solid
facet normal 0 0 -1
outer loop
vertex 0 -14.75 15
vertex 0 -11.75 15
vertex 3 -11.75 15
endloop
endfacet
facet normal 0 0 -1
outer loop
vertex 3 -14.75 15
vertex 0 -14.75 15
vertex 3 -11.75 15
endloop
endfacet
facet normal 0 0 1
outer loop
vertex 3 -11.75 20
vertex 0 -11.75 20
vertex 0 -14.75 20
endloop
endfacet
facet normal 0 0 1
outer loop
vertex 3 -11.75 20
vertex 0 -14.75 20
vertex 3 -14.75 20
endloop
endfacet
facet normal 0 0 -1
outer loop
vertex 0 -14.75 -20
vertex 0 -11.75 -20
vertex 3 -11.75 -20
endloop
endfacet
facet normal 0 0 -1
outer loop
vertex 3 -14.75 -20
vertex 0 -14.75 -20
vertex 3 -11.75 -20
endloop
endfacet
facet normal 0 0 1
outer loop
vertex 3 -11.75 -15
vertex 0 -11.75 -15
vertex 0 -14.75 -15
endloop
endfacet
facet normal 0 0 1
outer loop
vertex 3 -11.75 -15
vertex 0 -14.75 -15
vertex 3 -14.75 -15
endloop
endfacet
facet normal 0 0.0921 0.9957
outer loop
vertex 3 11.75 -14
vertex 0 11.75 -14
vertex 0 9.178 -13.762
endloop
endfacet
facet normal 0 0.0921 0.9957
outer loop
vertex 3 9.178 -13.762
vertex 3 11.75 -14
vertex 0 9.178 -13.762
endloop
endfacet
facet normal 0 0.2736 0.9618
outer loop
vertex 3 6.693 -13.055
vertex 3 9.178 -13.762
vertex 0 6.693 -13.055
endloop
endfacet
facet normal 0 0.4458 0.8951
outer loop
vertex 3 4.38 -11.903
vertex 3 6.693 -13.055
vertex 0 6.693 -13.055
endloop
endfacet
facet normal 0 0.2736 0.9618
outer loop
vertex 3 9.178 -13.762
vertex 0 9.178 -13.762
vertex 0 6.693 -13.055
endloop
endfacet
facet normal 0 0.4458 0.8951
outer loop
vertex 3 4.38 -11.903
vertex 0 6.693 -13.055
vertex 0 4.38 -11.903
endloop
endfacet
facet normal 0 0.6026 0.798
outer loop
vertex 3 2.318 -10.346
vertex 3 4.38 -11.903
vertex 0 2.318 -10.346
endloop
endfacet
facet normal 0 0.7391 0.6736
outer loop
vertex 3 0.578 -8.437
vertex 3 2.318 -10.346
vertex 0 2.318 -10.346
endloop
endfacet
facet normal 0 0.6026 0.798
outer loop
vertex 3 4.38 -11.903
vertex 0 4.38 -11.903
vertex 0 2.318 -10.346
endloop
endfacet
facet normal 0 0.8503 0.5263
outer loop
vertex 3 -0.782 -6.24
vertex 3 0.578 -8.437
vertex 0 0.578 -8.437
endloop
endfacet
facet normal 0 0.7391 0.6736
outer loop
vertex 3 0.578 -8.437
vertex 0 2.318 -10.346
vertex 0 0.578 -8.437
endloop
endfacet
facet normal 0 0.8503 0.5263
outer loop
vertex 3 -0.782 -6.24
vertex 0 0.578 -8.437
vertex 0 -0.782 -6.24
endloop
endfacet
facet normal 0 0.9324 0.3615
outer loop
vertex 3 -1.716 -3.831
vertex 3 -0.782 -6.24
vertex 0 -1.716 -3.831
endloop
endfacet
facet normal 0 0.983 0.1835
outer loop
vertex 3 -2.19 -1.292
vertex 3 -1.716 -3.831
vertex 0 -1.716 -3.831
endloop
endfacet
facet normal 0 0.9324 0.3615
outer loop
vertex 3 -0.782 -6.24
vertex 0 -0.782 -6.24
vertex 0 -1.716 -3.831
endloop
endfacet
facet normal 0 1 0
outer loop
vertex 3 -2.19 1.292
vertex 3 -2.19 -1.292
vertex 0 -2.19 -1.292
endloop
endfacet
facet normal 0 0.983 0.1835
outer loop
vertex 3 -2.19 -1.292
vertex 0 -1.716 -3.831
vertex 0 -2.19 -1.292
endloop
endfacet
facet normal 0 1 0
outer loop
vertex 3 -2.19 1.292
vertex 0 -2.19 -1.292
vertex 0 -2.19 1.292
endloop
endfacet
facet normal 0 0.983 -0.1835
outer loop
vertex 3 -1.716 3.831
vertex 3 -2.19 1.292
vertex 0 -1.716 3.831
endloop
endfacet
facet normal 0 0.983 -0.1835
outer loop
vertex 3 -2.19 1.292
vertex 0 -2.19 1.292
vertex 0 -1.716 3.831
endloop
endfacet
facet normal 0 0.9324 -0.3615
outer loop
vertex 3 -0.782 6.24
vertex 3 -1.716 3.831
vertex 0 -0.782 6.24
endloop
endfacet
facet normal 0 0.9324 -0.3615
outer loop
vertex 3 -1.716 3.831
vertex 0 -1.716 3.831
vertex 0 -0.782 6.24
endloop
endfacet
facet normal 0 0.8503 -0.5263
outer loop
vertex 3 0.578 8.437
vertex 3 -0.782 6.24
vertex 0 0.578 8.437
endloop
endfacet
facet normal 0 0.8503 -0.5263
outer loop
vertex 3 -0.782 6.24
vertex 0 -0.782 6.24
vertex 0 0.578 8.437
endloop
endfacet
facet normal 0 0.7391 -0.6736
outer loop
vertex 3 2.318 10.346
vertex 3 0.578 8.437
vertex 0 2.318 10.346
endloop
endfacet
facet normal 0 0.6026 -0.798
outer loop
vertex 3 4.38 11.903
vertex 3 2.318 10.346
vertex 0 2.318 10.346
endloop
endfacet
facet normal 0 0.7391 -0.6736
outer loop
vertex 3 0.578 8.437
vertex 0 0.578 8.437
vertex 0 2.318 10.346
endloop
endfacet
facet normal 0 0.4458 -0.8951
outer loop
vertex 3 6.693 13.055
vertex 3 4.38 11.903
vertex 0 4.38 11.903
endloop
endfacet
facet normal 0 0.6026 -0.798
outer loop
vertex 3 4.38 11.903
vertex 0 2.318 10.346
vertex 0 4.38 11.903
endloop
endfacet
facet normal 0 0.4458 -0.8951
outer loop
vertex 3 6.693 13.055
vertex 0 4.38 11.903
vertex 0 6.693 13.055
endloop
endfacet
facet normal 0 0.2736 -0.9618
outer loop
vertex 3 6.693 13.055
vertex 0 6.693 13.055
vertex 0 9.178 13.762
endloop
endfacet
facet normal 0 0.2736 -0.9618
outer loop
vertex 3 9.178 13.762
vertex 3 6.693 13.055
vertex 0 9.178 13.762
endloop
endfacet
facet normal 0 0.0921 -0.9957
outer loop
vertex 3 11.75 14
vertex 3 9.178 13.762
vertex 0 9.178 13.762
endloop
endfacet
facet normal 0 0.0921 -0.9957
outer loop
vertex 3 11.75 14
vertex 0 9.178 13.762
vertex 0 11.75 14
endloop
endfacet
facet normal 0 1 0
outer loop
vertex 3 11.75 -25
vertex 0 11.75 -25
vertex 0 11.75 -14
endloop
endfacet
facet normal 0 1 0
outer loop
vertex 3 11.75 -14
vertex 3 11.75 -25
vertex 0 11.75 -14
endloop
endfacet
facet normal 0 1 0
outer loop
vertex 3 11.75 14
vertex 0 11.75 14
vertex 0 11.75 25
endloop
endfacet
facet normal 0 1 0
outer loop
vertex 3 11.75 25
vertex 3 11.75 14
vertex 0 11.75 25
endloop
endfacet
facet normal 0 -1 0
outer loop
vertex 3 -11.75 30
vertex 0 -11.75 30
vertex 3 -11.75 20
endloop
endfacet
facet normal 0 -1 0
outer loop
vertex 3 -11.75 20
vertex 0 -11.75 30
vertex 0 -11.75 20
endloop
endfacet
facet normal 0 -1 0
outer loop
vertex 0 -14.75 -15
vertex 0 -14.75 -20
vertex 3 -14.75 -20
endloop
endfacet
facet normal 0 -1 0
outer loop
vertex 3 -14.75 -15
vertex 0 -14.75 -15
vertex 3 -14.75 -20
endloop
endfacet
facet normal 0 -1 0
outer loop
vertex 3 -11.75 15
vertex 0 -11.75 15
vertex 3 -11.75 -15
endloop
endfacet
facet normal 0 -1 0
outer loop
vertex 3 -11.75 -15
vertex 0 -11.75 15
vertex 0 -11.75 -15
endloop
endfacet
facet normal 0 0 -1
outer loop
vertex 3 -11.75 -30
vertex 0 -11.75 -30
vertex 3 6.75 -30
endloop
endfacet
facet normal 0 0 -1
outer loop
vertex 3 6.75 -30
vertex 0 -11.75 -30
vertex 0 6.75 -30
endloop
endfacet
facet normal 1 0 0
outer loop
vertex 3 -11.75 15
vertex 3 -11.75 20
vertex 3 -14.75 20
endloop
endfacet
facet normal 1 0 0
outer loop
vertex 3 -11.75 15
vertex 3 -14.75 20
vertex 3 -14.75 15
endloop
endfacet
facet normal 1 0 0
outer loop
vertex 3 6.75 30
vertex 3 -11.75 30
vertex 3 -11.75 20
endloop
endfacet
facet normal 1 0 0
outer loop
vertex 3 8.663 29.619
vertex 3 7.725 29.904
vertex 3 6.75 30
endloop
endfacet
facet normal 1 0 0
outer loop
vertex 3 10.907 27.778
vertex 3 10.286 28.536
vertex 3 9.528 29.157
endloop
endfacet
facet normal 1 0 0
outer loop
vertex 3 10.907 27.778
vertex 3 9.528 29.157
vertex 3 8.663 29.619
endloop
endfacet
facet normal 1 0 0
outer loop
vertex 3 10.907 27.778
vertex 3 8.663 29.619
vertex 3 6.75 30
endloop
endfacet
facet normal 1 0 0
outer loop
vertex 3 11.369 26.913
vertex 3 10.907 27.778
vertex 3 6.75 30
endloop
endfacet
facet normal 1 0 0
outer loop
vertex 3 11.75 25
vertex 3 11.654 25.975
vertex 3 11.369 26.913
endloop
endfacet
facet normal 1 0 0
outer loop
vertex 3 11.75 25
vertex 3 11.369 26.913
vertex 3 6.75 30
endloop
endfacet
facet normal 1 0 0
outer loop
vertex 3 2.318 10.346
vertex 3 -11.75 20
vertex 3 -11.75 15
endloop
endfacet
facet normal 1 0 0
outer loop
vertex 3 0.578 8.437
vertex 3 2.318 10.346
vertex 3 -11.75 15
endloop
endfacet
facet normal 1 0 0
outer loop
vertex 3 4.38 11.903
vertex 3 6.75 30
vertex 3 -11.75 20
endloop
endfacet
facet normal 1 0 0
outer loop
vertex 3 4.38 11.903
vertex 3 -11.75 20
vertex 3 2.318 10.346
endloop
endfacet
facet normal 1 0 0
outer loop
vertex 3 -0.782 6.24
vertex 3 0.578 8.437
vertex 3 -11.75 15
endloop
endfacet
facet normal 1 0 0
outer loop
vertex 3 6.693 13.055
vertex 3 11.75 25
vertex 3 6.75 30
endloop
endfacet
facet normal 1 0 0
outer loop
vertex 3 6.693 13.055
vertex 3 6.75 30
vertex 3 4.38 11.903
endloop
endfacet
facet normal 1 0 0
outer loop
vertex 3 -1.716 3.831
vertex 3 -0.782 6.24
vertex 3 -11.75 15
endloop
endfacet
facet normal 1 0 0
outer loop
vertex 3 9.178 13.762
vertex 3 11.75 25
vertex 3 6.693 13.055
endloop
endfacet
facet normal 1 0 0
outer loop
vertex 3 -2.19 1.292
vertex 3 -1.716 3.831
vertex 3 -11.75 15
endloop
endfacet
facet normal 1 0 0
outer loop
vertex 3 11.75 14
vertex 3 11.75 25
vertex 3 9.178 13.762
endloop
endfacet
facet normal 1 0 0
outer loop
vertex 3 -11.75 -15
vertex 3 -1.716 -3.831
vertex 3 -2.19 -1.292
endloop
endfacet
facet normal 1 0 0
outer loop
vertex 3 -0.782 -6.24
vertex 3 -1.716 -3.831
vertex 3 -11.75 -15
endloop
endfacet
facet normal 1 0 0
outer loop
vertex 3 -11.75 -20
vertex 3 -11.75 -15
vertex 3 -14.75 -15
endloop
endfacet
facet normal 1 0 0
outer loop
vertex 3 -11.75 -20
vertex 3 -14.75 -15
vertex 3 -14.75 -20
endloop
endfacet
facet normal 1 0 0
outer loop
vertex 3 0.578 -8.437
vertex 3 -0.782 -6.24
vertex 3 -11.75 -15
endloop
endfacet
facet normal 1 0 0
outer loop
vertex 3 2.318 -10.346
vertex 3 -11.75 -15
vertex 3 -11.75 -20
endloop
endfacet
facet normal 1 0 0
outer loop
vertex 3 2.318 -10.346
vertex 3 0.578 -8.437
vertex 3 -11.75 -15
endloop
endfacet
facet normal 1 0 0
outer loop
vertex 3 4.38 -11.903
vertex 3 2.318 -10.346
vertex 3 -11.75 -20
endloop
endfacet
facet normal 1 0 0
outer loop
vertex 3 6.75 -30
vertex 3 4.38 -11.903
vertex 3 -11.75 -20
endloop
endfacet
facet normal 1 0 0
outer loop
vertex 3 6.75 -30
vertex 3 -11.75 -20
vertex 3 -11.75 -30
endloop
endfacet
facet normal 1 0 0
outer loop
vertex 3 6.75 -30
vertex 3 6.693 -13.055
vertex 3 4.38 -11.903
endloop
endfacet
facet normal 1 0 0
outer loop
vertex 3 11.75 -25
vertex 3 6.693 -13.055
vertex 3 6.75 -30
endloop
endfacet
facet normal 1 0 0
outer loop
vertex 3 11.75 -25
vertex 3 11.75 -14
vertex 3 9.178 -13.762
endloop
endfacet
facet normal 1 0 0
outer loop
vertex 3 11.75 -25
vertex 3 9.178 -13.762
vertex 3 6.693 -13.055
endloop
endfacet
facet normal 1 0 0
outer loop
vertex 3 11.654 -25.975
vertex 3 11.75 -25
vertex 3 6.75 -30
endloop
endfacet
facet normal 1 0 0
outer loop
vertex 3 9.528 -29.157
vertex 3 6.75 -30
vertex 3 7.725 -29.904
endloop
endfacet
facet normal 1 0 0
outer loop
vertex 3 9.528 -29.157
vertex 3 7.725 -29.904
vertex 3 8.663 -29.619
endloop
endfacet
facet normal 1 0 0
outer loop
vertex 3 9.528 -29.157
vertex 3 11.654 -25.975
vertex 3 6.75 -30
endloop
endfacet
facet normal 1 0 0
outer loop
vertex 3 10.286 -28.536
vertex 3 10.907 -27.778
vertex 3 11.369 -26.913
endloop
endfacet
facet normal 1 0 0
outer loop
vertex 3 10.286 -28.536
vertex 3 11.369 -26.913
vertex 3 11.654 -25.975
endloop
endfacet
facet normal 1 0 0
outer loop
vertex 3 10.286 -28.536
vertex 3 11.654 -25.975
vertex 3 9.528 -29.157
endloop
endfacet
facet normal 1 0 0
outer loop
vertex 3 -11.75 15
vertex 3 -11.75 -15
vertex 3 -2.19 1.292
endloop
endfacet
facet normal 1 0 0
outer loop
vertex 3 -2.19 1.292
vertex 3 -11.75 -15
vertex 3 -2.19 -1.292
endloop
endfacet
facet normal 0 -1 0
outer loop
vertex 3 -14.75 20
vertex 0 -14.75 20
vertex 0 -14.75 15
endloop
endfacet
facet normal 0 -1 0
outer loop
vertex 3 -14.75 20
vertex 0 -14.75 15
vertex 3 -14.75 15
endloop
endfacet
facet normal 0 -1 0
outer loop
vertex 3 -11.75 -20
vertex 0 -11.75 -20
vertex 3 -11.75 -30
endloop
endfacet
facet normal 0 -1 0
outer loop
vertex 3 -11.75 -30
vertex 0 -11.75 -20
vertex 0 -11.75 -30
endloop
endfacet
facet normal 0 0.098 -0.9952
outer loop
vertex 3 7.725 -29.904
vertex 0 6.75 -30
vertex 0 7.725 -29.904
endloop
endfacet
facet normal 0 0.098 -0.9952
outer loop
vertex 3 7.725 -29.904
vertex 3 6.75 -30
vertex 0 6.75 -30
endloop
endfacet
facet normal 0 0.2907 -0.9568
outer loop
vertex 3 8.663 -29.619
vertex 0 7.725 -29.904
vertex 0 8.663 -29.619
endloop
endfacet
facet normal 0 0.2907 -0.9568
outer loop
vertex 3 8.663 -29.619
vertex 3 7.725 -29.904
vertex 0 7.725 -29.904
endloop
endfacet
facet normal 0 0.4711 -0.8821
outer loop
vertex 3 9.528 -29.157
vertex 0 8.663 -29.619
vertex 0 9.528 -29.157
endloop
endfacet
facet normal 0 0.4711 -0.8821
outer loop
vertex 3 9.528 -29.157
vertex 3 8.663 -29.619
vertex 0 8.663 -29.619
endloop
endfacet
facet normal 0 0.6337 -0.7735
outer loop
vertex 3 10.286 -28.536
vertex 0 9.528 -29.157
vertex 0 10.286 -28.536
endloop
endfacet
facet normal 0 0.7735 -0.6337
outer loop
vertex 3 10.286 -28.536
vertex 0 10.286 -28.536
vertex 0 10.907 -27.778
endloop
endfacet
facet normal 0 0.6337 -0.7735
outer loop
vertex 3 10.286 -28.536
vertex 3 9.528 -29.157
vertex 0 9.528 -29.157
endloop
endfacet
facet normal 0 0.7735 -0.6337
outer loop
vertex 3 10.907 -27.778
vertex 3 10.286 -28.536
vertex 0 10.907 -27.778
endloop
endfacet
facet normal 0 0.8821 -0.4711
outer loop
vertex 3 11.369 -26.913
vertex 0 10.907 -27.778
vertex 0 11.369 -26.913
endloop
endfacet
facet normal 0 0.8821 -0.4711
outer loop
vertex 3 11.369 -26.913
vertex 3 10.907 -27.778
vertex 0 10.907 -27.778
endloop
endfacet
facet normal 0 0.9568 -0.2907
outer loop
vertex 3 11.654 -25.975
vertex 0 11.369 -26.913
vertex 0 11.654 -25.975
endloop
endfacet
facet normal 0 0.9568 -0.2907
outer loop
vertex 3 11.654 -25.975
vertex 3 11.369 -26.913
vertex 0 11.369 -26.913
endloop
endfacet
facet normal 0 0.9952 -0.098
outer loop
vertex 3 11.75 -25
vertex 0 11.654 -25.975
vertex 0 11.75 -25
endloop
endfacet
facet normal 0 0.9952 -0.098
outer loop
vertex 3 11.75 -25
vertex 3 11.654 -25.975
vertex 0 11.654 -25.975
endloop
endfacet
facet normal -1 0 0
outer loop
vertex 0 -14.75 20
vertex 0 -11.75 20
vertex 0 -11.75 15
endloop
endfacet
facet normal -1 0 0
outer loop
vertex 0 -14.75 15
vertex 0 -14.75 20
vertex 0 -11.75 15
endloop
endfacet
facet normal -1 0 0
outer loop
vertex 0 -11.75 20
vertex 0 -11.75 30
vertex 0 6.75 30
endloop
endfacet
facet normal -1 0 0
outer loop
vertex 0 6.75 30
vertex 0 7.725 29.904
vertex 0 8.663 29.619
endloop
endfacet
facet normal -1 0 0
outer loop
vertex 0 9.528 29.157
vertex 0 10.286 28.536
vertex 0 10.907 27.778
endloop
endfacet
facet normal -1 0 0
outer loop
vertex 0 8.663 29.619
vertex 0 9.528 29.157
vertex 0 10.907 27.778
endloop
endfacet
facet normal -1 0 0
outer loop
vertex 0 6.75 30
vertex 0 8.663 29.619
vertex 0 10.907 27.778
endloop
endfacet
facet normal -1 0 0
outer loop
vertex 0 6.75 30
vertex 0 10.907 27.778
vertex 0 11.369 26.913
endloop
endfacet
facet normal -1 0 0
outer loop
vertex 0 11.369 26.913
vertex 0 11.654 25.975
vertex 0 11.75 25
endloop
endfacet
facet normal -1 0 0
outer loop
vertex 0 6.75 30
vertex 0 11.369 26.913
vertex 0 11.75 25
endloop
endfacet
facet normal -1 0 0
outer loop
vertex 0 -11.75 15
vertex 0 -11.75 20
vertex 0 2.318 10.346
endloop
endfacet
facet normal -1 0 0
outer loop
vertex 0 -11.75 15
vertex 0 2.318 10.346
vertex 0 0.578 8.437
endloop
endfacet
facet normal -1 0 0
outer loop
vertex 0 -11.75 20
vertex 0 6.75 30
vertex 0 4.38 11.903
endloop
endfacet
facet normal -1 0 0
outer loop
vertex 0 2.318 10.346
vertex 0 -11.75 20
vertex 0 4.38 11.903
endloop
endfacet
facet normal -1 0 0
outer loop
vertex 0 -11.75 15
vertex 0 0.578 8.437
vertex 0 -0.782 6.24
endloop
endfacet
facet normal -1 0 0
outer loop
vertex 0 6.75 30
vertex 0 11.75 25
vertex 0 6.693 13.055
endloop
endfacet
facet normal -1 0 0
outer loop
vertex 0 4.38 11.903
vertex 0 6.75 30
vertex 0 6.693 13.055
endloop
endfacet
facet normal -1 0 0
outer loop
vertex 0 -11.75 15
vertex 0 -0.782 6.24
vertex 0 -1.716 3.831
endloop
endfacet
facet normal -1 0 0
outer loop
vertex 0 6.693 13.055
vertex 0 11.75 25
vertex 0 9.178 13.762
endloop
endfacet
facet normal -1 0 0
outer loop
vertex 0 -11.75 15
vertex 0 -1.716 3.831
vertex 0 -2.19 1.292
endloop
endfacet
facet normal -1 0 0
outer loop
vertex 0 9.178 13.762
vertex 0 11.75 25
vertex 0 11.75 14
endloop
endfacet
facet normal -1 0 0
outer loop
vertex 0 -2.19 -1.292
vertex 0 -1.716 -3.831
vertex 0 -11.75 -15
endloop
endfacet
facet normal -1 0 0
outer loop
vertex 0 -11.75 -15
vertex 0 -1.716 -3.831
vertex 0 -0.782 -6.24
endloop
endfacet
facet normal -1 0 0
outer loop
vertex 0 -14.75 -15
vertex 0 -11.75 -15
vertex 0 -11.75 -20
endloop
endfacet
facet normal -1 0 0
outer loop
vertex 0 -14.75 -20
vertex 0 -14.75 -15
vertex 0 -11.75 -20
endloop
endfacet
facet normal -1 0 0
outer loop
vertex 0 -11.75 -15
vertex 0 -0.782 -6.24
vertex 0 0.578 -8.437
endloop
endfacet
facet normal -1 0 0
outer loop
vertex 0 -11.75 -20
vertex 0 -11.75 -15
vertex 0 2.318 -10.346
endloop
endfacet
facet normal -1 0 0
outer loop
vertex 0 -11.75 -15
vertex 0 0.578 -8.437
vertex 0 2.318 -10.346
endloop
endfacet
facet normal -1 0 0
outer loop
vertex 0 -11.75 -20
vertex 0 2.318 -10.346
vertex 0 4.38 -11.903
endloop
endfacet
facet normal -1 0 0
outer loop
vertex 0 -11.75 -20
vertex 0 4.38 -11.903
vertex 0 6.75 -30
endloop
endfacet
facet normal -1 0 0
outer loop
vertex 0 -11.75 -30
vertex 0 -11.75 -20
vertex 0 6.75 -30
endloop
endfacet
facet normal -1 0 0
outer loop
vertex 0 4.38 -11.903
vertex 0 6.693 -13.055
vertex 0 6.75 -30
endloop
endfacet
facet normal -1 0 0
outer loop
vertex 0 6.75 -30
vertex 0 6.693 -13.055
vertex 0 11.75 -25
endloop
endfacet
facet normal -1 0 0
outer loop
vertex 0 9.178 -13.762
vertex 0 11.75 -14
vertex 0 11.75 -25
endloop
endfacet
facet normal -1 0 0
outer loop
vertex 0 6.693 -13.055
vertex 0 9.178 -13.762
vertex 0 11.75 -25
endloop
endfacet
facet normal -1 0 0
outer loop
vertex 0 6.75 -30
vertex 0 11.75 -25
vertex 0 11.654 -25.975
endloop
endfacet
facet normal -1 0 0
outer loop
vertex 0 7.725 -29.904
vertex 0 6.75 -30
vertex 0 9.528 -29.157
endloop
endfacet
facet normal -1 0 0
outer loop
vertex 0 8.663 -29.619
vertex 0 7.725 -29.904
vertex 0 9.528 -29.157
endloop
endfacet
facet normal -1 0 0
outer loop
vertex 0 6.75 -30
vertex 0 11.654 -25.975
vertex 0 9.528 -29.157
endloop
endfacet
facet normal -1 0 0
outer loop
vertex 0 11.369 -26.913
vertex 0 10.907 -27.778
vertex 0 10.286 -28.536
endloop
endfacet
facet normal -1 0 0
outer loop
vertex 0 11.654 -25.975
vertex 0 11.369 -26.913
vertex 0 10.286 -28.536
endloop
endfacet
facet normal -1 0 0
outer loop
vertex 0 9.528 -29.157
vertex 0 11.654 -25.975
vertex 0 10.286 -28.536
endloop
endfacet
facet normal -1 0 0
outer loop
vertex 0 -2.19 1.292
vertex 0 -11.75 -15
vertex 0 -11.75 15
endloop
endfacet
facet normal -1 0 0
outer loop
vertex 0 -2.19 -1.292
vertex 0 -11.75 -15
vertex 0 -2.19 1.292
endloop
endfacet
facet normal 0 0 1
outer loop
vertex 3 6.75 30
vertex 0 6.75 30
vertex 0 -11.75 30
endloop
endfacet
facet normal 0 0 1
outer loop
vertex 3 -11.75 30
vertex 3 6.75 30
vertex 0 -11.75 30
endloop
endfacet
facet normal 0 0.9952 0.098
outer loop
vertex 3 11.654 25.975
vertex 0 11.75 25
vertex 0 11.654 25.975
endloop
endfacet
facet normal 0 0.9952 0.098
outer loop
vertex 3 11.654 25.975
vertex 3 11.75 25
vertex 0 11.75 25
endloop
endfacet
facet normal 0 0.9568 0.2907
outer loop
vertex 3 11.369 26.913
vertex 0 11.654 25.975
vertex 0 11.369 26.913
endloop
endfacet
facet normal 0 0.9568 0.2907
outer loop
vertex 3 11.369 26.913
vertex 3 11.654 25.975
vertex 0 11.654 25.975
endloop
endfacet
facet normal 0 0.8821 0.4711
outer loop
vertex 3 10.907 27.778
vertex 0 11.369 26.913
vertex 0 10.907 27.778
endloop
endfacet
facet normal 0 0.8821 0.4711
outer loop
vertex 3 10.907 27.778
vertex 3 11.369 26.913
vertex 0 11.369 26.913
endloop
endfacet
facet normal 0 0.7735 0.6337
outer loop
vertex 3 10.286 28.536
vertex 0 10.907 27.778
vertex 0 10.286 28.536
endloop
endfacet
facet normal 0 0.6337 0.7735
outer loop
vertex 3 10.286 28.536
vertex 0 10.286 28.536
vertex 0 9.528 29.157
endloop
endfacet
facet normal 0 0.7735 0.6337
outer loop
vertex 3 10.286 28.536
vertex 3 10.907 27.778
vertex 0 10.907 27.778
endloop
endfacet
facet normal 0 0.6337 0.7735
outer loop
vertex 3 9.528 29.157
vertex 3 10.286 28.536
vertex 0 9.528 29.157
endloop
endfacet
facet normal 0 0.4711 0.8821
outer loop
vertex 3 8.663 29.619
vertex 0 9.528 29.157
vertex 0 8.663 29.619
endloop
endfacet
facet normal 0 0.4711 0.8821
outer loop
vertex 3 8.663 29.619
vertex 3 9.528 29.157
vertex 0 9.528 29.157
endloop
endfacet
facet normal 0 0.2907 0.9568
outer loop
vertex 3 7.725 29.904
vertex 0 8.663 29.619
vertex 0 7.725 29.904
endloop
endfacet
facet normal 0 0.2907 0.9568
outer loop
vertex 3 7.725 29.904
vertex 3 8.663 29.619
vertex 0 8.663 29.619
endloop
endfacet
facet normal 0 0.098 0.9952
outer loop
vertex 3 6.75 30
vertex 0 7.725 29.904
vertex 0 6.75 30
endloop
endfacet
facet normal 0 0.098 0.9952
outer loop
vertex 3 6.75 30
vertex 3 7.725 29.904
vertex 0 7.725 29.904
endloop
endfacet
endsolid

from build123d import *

# Parameters (mm, degrees)
BOSS_EXTRUDE1_DEPTH = 3
FILLET1_R           = 5
SKETCH3_W           = 3
SKETCH3_H           = 5
BOSS_EXTRUDE2_DEPTH = 3


with BuildPart() as part:
    # Sketch1 → Boss-Extrude1 (new body)
    with BuildSketch(Plane(origin=(0, 0, 0), x_dir=(0, 0, -1), z_dir=(1, 0, 0))):
        with BuildLine():
            Line((-14, 11.75), (-30, 11.75))
            Line((-30, 11.75), (-30, -11.75))
            Line((-30, -11.75), (30, -11.75))
            Line((30, -11.75), (30, 11.75))
            Line((30, 11.75), (14, 11.75))
            ThreePointArc((14, 11.75), (0, -2.25), (-14, 11.75))
        make_face()
    extrude(amount=BOSS_EXTRUDE1_DEPTH)

    # Fillet1
    fillet1_edges = [part.edges().sort_by_distance(p)[0] for p in [
        (1.5, 11.75, 30),
        (1.5, 11.75, -30),
    ]]
    fillet(fillet1_edges, radius=FILLET1_R)

    # Sketch3 → Boss-Extrude2 (add)
    with BuildSketch(Plane.XZ.offset(11.75)):
        with Locations((1.5, 17.5)):
            Rectangle(SKETCH3_W, SKETCH3_H)
    boss_extrude2 = extrude(amount=BOSS_EXTRUDE2_DEPTH)

    # Mirror3: Boss-Extrude2 across plane
    add(boss_extrude2.mirror(Plane.XY))


solid = part.part
